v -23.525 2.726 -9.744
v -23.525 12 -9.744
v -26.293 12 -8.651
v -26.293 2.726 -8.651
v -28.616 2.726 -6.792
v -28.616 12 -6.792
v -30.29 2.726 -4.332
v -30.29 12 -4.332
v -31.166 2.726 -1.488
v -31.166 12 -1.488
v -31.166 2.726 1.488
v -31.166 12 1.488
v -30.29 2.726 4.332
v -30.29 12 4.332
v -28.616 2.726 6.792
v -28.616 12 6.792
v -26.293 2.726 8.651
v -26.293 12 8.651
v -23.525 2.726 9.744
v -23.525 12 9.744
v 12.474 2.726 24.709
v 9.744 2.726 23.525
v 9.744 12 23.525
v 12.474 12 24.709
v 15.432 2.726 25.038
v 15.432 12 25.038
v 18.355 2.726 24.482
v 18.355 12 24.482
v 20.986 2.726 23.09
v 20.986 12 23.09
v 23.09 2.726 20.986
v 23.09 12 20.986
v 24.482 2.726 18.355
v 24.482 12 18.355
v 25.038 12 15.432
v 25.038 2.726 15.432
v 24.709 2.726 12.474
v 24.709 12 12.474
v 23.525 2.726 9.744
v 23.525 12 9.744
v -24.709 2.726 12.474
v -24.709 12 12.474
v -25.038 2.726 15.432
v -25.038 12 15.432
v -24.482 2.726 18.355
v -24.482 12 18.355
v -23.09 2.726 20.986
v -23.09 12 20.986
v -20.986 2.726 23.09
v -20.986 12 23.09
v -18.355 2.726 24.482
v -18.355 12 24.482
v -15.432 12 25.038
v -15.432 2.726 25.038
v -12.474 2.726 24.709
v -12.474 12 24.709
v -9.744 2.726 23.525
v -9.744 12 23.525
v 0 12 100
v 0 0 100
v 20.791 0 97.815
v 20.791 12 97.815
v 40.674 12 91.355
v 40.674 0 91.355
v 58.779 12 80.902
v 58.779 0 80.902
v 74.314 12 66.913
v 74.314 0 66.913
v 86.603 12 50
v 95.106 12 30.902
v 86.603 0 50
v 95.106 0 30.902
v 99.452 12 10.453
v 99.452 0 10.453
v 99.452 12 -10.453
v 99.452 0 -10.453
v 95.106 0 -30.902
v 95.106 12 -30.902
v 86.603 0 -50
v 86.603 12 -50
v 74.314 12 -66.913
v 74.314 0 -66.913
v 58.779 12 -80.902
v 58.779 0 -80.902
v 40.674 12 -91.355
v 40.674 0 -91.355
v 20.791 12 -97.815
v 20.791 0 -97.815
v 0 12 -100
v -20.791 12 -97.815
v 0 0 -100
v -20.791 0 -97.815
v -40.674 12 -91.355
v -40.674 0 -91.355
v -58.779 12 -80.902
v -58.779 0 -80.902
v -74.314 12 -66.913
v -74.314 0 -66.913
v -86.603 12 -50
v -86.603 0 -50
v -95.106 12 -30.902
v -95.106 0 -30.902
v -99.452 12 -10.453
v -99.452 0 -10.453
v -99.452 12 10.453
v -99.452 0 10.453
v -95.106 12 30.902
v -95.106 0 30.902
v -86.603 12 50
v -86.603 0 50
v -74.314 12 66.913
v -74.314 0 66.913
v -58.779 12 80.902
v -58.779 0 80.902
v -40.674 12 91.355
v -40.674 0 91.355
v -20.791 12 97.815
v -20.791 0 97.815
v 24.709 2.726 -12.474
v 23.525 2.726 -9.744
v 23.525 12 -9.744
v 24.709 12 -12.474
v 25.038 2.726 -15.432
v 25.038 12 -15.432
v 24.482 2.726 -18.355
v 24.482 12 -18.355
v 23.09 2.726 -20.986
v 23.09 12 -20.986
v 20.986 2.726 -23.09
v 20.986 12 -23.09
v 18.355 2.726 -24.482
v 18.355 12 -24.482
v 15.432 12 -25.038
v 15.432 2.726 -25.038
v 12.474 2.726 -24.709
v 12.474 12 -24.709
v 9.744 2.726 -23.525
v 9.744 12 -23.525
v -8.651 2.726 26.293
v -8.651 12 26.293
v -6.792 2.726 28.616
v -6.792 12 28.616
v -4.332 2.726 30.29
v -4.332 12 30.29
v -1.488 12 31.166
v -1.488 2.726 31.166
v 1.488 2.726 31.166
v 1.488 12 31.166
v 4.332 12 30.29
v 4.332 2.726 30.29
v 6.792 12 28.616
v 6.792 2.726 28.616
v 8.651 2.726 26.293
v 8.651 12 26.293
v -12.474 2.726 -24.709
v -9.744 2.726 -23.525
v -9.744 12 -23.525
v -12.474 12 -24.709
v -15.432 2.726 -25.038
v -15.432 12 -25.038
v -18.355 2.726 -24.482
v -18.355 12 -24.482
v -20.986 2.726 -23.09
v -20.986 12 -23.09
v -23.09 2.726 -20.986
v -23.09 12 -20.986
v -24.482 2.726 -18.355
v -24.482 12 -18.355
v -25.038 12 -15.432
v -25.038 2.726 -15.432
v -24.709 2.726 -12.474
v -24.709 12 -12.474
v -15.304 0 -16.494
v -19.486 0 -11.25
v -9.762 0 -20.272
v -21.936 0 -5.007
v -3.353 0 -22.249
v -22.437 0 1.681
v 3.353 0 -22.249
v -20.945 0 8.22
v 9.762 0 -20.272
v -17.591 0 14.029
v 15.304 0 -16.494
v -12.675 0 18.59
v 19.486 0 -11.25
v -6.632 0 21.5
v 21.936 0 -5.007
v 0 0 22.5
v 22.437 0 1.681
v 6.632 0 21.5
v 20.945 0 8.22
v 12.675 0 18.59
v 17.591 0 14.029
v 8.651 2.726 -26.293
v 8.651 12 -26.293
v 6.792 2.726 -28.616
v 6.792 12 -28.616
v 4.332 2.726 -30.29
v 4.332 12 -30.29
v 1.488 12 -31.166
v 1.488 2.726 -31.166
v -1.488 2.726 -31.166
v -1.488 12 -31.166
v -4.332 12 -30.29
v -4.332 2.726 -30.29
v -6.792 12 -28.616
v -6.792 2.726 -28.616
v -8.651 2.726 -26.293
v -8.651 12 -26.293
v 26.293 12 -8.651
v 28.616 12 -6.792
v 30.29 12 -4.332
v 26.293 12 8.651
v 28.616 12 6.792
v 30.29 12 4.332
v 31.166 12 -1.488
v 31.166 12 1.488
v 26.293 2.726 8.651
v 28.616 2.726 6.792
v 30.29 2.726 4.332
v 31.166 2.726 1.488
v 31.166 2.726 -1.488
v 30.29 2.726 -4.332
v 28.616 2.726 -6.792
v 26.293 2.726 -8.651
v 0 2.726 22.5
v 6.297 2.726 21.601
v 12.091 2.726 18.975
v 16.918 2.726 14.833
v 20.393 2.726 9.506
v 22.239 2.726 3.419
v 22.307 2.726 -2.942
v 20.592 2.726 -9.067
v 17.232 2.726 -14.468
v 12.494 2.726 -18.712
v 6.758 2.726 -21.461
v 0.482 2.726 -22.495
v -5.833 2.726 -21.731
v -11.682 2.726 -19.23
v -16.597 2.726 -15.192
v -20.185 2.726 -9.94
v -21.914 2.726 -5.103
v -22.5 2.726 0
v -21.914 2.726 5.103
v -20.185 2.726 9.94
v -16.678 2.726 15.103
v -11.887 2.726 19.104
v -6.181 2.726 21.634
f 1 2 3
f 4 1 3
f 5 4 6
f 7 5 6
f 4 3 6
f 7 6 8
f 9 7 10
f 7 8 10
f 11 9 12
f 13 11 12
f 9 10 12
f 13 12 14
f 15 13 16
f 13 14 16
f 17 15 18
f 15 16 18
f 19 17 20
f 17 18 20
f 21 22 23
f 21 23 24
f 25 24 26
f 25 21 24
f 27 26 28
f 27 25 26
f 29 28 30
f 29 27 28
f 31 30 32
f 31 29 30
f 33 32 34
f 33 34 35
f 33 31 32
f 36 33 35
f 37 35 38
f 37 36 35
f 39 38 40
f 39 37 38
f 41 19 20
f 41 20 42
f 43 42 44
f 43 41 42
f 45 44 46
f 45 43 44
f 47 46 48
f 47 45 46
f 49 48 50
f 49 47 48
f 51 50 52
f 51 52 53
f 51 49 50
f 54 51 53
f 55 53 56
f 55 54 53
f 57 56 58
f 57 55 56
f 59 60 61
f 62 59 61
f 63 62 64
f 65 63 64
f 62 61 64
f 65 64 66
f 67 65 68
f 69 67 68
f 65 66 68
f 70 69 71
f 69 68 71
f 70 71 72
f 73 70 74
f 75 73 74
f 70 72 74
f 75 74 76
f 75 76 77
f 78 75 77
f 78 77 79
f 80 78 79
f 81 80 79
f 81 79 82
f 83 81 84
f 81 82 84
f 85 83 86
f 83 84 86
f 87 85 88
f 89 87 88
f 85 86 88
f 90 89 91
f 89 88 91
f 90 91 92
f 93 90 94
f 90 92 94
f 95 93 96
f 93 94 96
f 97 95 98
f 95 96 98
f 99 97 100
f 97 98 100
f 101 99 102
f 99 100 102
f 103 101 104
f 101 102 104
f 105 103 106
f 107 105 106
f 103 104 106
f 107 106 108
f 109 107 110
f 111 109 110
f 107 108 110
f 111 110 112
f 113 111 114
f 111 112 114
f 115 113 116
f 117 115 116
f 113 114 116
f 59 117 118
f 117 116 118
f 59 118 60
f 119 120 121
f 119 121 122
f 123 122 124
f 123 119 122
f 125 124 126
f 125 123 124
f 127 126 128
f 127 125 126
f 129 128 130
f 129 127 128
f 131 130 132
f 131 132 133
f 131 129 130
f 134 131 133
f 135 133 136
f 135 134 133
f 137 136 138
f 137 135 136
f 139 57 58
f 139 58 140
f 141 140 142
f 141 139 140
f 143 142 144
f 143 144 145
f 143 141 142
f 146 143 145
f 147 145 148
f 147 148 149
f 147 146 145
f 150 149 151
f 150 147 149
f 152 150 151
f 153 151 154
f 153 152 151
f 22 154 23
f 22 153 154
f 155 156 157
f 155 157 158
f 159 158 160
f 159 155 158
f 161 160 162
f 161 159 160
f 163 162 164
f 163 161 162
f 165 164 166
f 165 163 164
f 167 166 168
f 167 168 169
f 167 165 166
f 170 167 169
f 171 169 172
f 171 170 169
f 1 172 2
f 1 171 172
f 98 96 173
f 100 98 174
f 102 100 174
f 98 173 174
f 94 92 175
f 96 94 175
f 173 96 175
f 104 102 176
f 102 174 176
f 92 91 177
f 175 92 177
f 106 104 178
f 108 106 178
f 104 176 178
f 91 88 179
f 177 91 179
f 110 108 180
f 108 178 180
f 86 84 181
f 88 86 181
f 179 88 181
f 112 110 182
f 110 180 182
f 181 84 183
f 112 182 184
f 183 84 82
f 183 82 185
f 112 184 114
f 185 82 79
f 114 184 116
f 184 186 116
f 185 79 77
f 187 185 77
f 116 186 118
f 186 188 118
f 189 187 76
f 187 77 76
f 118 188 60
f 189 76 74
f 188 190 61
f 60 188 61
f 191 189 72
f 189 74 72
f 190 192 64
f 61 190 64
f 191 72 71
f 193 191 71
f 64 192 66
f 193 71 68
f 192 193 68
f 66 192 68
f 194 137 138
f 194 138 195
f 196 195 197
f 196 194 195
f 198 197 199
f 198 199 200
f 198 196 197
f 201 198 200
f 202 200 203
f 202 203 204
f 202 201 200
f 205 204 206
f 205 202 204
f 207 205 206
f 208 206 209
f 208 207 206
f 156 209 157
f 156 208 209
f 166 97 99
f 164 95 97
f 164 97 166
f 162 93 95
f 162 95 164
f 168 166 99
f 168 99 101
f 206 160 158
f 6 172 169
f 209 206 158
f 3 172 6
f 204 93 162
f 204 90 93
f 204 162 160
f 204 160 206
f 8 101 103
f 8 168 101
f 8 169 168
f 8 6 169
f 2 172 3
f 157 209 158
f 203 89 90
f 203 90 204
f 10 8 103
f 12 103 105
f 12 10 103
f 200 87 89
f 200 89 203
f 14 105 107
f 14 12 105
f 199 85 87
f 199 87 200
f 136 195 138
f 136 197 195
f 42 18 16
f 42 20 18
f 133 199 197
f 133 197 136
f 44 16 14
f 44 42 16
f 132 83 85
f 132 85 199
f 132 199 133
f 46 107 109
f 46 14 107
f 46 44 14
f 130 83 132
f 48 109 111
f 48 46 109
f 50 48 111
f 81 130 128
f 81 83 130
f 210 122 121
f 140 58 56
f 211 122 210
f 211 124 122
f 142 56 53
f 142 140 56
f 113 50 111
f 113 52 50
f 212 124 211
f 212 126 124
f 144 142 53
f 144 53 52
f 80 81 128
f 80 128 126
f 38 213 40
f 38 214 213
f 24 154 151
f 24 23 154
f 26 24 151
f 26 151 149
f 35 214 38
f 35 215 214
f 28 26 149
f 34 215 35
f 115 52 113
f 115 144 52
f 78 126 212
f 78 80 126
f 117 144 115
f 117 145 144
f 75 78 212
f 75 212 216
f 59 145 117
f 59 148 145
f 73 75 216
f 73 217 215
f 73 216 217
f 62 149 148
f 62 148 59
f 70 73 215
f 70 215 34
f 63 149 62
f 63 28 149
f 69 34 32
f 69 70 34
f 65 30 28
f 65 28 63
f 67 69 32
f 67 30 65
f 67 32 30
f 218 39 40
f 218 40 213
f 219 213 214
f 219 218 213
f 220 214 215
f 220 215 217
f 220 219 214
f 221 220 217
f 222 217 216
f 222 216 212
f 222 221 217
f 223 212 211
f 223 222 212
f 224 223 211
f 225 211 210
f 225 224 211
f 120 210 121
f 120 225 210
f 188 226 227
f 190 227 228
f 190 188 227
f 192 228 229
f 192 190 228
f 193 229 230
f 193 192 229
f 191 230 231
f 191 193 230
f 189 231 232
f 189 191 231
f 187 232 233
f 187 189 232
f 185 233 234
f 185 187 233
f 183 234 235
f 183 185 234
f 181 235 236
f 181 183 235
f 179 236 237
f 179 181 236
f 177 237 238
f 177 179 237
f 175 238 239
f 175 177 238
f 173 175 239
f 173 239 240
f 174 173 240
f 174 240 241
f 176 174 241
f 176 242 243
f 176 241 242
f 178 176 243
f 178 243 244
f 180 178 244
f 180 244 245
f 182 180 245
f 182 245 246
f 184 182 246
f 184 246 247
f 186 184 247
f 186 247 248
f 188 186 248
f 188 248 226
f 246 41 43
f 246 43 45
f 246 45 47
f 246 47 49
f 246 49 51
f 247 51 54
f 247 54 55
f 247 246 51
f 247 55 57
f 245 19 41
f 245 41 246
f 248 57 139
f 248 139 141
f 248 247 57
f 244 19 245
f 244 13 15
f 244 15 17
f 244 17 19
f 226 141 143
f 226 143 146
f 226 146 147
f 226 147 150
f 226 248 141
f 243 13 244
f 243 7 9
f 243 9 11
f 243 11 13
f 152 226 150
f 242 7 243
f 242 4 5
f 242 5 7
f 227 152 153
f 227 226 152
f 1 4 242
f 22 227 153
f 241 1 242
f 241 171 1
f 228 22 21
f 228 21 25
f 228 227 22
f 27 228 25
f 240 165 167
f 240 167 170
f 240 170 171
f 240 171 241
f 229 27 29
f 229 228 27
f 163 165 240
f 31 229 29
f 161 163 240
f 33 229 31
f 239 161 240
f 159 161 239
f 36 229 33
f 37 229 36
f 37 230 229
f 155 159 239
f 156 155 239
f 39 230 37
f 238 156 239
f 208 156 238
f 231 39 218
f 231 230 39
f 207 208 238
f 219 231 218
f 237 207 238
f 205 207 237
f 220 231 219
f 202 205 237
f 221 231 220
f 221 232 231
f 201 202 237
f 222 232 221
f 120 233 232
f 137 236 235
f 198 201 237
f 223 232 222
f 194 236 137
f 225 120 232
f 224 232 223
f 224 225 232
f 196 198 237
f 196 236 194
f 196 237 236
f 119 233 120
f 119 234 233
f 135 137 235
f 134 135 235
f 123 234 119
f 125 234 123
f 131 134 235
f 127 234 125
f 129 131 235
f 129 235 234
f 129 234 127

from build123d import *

# Parameters (mm, degrees)
SKETCH1_R           = 100
BOSS_EXTRUDE1_DEPTH = 12
SKETCH2_R           = 22.5
CUT_EXTRUDE1_DEPTH  = 142.929559994
SKETCH3_R           = 10
CUT_EXTRUDE2_DEPTH  = 9.274253005
CIRPATTERN1_COUNT   = 8


with BuildPart() as part:
    # Sketch1 → Boss-Extrude1 (new body)
    with BuildSketch(Plane(origin=(0, 0, 0), x_dir=(1, 0, 0), z_dir=(0, 1, 0))):
        Circle(SKETCH1_R)
    extrude(amount=BOSS_EXTRUDE1_DEPTH)

    # Sketch2 → Cut-Extrude1 (cut, through all)
    with BuildSketch(Plane(origin=(0, 0, 0), x_dir=(1, 0, 0), z_dir=(0, 1, 0))):
        Circle(SKETCH2_R)
    extrude(amount=CUT_EXTRUDE1_DEPTH, mode=Mode.SUBTRACT)

    # Sketch3 → Cut-Extrude2 (cut)
    with BuildSketch(Plane(origin=(0, 12, 0), x_dir=(1, 0, 0), z_dir=(0, 1, 0))):
        with Locations((-21.277260677, 0)):
            Circle(SKETCH3_R)
    cut_extrude2 = extrude(amount=-CUT_EXTRUDE2_DEPTH, mode=Mode.SUBTRACT)

    # CirPattern1: Cut-Extrude2 ×8 about axis
    cirpattern1_axis = Axis((0, 0, 0), (0, 1, 0))
    for i in range(1, CIRPATTERN1_COUNT):
        add(cut_extrude2.rotate(cirpattern1_axis, i * 360 / CIRPATTERN1_COUNT), mode=Mode.SUBTRACT)


solid = part.part
